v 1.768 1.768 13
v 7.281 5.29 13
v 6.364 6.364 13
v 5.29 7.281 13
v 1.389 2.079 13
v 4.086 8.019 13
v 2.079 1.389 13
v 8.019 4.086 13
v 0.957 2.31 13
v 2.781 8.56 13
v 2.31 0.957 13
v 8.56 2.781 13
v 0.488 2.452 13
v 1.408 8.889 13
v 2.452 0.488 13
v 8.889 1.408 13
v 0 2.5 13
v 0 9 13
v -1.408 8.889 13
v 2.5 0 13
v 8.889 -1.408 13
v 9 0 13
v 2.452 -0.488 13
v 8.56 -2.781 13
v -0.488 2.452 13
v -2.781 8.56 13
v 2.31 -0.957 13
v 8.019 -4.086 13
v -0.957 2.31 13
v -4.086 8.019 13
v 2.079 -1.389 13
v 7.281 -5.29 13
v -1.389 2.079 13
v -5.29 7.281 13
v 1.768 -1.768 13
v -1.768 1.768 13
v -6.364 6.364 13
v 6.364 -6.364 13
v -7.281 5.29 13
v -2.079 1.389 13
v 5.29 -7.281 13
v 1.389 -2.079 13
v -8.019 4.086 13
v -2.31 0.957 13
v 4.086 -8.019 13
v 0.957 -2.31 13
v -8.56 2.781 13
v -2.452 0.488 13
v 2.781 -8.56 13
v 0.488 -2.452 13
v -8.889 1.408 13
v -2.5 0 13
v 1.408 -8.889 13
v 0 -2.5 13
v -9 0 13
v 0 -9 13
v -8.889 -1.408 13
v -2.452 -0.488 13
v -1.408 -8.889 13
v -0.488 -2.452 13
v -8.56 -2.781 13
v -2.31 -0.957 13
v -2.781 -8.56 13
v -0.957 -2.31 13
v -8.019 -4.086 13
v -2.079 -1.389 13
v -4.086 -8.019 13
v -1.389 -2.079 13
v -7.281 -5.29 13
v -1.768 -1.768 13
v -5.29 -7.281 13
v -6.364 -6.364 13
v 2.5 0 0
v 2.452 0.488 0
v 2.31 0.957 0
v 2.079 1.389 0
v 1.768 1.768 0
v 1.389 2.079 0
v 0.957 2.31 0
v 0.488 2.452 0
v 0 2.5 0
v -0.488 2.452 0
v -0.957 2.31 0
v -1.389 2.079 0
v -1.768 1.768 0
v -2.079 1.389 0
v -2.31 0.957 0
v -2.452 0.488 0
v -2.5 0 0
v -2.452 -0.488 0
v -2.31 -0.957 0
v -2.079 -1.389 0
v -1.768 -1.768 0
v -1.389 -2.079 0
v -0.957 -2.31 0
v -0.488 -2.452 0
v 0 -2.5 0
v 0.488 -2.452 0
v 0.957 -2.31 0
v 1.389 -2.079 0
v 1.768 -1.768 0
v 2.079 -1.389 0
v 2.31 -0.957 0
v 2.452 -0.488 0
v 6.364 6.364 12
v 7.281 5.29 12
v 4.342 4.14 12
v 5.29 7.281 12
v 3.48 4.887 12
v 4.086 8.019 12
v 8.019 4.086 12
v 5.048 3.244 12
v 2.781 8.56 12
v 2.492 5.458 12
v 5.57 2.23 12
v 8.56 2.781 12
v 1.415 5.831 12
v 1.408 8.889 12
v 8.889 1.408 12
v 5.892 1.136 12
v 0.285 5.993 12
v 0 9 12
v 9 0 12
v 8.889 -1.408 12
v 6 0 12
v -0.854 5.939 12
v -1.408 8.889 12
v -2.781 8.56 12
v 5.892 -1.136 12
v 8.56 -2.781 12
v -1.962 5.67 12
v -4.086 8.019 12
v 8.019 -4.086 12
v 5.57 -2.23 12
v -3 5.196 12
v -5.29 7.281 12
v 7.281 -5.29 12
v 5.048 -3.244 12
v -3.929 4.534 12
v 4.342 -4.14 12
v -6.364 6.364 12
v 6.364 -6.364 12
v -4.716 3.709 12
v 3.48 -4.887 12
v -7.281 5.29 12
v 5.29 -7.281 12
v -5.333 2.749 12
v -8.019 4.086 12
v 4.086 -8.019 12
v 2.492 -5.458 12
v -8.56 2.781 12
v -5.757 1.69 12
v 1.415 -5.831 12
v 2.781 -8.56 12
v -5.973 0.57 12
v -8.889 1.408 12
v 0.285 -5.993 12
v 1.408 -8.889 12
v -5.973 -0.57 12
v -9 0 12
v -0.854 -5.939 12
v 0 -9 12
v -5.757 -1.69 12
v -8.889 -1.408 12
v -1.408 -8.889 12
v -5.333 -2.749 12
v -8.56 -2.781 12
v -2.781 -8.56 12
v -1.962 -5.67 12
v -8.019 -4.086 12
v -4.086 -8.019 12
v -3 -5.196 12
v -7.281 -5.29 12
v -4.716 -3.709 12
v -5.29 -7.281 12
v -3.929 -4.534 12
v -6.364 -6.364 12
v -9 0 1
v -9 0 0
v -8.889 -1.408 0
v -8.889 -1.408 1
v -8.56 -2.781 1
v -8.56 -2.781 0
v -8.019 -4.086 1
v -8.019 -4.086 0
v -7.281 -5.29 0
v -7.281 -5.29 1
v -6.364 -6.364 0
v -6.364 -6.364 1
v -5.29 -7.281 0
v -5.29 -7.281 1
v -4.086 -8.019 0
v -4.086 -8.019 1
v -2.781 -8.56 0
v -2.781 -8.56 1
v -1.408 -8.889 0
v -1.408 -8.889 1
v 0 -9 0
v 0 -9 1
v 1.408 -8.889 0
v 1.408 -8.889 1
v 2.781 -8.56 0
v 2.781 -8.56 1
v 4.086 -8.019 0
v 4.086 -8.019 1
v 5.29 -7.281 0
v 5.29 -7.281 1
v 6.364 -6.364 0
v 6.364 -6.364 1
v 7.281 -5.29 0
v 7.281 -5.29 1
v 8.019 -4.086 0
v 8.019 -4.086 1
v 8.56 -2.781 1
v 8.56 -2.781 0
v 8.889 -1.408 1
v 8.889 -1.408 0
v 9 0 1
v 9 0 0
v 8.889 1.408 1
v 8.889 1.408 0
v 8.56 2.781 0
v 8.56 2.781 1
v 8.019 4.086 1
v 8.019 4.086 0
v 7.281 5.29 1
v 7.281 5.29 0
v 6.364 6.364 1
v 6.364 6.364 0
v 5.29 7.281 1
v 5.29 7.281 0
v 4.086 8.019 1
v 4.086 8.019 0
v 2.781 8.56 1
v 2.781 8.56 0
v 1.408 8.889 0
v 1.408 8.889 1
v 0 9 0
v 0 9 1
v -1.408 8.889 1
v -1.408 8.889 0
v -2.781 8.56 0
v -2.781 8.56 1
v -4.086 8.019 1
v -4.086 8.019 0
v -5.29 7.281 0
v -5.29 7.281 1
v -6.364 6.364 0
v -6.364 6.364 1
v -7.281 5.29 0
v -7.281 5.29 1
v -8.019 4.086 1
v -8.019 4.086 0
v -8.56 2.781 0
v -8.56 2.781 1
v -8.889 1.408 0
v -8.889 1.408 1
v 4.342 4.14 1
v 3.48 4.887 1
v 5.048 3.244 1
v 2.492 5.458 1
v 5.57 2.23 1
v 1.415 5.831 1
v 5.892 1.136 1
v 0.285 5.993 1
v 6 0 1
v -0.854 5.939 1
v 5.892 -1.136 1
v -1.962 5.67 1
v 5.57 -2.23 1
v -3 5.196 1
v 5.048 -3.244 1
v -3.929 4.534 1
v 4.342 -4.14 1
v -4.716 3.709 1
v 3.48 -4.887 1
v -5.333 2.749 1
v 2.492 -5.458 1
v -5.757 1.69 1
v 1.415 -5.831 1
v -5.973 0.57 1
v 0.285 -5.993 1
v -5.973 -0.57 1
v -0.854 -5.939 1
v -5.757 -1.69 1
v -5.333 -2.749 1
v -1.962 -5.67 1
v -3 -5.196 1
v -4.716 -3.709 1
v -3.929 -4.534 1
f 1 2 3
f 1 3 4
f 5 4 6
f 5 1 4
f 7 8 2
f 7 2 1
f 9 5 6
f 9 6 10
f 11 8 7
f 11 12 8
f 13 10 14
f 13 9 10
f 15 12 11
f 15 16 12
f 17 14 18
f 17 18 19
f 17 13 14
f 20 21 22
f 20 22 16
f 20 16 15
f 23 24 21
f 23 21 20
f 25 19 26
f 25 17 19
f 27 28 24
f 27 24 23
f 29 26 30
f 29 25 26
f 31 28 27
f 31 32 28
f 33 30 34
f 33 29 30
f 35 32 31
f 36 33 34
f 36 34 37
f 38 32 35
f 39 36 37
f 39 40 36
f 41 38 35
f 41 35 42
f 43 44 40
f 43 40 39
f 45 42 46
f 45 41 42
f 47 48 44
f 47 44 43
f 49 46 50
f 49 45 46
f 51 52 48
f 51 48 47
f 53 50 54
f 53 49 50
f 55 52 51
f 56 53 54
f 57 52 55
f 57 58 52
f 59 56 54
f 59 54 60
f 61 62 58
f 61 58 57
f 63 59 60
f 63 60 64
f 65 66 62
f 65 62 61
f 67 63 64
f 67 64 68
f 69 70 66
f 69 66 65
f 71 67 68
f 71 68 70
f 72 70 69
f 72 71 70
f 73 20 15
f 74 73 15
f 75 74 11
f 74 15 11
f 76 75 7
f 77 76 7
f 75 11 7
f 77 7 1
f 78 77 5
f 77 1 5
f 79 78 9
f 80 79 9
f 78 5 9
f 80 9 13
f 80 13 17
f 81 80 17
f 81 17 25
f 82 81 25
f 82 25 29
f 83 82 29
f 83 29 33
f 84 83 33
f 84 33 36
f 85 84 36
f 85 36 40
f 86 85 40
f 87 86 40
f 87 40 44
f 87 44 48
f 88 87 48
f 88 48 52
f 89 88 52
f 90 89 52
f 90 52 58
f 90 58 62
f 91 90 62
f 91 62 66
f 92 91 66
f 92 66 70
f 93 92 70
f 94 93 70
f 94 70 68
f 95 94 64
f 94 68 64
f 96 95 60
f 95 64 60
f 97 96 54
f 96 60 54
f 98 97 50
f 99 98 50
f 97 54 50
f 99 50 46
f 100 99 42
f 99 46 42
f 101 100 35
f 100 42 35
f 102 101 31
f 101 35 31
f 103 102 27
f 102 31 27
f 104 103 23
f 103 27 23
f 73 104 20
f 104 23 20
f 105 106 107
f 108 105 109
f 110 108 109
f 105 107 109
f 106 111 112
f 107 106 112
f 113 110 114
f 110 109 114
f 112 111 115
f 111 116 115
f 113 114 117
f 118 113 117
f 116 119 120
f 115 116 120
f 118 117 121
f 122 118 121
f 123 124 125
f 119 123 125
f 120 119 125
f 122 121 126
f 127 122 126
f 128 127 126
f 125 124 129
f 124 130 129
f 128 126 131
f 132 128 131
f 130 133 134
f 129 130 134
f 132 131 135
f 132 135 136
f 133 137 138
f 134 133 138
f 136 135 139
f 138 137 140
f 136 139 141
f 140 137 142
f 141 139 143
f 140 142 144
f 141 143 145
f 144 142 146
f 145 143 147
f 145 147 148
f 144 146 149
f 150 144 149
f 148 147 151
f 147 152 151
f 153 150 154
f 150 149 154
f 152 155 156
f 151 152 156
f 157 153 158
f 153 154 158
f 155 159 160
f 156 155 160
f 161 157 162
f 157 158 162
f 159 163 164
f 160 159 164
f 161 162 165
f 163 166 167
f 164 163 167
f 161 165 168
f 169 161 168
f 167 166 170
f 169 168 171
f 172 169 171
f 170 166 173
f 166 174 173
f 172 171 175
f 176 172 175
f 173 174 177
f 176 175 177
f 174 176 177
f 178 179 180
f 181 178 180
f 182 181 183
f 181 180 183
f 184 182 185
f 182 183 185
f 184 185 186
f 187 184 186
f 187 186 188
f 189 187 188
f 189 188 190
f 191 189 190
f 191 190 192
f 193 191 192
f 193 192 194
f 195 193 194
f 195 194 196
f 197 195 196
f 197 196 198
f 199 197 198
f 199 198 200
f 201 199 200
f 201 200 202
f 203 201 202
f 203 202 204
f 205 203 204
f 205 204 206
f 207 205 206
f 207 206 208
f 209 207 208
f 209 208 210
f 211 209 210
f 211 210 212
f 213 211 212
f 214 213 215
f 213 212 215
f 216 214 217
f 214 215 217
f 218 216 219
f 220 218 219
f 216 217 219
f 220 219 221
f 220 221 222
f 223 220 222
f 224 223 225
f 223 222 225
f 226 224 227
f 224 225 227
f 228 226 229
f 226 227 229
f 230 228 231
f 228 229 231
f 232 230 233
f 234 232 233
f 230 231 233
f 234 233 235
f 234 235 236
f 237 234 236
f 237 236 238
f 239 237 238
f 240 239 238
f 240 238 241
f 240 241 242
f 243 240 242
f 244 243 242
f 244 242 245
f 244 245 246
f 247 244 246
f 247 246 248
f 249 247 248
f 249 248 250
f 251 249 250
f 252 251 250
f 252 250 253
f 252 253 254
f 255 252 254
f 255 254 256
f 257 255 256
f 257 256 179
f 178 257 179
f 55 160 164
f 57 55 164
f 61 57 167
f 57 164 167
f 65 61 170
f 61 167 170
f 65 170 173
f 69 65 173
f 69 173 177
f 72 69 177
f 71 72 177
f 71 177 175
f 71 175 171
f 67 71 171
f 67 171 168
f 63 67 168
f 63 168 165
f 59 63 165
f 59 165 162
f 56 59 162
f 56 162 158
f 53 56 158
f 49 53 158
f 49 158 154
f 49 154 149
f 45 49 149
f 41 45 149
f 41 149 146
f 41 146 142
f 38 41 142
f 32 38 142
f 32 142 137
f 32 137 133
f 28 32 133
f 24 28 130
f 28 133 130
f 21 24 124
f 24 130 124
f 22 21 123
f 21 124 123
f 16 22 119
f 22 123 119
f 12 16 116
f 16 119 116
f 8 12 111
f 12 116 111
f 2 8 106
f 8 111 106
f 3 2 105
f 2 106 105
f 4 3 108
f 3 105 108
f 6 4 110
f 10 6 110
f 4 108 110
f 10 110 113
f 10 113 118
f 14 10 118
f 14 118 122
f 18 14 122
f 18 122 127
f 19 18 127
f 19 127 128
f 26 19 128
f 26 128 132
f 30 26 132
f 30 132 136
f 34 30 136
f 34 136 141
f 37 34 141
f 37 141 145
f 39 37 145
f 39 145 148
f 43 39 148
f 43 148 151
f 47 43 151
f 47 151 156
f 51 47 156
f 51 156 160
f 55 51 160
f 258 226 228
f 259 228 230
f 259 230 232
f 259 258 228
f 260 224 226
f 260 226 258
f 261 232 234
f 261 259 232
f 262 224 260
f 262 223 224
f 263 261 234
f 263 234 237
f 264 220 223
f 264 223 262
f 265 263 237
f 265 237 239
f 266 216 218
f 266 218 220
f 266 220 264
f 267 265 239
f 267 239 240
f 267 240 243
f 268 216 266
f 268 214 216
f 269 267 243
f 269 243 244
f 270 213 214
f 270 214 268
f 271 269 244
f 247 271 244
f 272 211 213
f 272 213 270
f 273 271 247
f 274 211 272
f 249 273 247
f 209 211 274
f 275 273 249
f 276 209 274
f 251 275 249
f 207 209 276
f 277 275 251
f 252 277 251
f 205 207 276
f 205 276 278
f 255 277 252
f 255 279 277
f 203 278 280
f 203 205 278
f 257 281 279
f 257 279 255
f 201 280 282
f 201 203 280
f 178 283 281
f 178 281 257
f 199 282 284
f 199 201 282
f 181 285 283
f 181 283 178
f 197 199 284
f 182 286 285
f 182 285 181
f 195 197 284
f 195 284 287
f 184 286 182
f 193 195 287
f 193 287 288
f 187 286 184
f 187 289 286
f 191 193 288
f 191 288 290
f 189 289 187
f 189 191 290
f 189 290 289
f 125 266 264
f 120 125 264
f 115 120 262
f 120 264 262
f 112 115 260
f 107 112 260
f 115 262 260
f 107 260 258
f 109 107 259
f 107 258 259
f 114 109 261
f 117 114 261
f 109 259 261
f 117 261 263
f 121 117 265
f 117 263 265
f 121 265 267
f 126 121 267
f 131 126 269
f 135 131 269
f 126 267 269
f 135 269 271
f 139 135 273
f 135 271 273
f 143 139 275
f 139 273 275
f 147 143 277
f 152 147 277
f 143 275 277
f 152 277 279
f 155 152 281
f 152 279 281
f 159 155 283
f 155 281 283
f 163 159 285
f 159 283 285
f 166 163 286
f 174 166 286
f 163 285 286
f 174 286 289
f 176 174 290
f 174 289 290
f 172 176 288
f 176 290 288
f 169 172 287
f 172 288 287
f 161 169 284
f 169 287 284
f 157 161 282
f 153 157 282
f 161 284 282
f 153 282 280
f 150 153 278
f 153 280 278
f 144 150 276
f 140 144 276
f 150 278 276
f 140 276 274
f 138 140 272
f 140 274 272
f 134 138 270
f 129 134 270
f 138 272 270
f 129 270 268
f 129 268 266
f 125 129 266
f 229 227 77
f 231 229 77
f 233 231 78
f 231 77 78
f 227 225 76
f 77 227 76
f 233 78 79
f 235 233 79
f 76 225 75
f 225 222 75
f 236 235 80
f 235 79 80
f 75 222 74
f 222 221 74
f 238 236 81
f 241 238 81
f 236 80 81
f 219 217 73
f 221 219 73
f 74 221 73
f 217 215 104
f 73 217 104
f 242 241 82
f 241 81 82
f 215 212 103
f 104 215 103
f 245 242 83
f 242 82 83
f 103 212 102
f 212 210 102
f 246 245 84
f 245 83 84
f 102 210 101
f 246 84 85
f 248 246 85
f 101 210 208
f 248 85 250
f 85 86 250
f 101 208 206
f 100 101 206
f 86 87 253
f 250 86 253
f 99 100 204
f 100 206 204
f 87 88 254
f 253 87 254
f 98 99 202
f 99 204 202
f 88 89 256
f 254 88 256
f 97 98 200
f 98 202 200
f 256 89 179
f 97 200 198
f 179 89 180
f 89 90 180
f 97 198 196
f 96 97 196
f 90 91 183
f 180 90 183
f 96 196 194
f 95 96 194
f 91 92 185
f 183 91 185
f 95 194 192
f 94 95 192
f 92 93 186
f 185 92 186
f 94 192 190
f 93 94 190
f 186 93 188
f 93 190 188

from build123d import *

# Parameters (mm, degrees)
SKETCH_1_R          = 9
EXTRUDE_1_DEPTH     = 13
CUT_EXTRUDE_START   = -12
SKETCH_2_R          = 9
SKETCH_2_R_2        = 6
CUT_EXTRUDE_1_DEPTH = 11
SKETCH_3_R          = 2.5
CUT_EXTRUDE_2_DEPTH = 19.193405399


with BuildPart() as part:
    # 草图1 → 凸台-拉伸1 (new body)
    with BuildSketch(Plane.XY):
        with Locations(Location((0, 0, 0), (0, 0, 180))):
            Circle(SKETCH_1_R)
    extrude(amount=EXTRUDE_1_DEPTH)

    # 草图2 → 切除-拉伸1 (cut)
    with BuildSketch(Plane.XY.offset(13).offset(CUT_EXTRUDE_START)):
        with Locations(Location((0, 0, 0), (0, 0, 180))):
            Circle(SKETCH_2_R)
        Circle(SKETCH_2_R_2, mode=Mode.SUBTRACT)
    extrude(amount=CUT_EXTRUDE_1_DEPTH, mode=Mode.SUBTRACT)

    # 草图3 → 切除-拉伸2 (cut, through all)
    with BuildSketch(Plane.XY.offset(13)):
        Circle(SKETCH_3_R)
    extrude(amount=-CUT_EXTRUDE_2_DEPTH, mode=Mode.SUBTRACT)


solid = part.part
